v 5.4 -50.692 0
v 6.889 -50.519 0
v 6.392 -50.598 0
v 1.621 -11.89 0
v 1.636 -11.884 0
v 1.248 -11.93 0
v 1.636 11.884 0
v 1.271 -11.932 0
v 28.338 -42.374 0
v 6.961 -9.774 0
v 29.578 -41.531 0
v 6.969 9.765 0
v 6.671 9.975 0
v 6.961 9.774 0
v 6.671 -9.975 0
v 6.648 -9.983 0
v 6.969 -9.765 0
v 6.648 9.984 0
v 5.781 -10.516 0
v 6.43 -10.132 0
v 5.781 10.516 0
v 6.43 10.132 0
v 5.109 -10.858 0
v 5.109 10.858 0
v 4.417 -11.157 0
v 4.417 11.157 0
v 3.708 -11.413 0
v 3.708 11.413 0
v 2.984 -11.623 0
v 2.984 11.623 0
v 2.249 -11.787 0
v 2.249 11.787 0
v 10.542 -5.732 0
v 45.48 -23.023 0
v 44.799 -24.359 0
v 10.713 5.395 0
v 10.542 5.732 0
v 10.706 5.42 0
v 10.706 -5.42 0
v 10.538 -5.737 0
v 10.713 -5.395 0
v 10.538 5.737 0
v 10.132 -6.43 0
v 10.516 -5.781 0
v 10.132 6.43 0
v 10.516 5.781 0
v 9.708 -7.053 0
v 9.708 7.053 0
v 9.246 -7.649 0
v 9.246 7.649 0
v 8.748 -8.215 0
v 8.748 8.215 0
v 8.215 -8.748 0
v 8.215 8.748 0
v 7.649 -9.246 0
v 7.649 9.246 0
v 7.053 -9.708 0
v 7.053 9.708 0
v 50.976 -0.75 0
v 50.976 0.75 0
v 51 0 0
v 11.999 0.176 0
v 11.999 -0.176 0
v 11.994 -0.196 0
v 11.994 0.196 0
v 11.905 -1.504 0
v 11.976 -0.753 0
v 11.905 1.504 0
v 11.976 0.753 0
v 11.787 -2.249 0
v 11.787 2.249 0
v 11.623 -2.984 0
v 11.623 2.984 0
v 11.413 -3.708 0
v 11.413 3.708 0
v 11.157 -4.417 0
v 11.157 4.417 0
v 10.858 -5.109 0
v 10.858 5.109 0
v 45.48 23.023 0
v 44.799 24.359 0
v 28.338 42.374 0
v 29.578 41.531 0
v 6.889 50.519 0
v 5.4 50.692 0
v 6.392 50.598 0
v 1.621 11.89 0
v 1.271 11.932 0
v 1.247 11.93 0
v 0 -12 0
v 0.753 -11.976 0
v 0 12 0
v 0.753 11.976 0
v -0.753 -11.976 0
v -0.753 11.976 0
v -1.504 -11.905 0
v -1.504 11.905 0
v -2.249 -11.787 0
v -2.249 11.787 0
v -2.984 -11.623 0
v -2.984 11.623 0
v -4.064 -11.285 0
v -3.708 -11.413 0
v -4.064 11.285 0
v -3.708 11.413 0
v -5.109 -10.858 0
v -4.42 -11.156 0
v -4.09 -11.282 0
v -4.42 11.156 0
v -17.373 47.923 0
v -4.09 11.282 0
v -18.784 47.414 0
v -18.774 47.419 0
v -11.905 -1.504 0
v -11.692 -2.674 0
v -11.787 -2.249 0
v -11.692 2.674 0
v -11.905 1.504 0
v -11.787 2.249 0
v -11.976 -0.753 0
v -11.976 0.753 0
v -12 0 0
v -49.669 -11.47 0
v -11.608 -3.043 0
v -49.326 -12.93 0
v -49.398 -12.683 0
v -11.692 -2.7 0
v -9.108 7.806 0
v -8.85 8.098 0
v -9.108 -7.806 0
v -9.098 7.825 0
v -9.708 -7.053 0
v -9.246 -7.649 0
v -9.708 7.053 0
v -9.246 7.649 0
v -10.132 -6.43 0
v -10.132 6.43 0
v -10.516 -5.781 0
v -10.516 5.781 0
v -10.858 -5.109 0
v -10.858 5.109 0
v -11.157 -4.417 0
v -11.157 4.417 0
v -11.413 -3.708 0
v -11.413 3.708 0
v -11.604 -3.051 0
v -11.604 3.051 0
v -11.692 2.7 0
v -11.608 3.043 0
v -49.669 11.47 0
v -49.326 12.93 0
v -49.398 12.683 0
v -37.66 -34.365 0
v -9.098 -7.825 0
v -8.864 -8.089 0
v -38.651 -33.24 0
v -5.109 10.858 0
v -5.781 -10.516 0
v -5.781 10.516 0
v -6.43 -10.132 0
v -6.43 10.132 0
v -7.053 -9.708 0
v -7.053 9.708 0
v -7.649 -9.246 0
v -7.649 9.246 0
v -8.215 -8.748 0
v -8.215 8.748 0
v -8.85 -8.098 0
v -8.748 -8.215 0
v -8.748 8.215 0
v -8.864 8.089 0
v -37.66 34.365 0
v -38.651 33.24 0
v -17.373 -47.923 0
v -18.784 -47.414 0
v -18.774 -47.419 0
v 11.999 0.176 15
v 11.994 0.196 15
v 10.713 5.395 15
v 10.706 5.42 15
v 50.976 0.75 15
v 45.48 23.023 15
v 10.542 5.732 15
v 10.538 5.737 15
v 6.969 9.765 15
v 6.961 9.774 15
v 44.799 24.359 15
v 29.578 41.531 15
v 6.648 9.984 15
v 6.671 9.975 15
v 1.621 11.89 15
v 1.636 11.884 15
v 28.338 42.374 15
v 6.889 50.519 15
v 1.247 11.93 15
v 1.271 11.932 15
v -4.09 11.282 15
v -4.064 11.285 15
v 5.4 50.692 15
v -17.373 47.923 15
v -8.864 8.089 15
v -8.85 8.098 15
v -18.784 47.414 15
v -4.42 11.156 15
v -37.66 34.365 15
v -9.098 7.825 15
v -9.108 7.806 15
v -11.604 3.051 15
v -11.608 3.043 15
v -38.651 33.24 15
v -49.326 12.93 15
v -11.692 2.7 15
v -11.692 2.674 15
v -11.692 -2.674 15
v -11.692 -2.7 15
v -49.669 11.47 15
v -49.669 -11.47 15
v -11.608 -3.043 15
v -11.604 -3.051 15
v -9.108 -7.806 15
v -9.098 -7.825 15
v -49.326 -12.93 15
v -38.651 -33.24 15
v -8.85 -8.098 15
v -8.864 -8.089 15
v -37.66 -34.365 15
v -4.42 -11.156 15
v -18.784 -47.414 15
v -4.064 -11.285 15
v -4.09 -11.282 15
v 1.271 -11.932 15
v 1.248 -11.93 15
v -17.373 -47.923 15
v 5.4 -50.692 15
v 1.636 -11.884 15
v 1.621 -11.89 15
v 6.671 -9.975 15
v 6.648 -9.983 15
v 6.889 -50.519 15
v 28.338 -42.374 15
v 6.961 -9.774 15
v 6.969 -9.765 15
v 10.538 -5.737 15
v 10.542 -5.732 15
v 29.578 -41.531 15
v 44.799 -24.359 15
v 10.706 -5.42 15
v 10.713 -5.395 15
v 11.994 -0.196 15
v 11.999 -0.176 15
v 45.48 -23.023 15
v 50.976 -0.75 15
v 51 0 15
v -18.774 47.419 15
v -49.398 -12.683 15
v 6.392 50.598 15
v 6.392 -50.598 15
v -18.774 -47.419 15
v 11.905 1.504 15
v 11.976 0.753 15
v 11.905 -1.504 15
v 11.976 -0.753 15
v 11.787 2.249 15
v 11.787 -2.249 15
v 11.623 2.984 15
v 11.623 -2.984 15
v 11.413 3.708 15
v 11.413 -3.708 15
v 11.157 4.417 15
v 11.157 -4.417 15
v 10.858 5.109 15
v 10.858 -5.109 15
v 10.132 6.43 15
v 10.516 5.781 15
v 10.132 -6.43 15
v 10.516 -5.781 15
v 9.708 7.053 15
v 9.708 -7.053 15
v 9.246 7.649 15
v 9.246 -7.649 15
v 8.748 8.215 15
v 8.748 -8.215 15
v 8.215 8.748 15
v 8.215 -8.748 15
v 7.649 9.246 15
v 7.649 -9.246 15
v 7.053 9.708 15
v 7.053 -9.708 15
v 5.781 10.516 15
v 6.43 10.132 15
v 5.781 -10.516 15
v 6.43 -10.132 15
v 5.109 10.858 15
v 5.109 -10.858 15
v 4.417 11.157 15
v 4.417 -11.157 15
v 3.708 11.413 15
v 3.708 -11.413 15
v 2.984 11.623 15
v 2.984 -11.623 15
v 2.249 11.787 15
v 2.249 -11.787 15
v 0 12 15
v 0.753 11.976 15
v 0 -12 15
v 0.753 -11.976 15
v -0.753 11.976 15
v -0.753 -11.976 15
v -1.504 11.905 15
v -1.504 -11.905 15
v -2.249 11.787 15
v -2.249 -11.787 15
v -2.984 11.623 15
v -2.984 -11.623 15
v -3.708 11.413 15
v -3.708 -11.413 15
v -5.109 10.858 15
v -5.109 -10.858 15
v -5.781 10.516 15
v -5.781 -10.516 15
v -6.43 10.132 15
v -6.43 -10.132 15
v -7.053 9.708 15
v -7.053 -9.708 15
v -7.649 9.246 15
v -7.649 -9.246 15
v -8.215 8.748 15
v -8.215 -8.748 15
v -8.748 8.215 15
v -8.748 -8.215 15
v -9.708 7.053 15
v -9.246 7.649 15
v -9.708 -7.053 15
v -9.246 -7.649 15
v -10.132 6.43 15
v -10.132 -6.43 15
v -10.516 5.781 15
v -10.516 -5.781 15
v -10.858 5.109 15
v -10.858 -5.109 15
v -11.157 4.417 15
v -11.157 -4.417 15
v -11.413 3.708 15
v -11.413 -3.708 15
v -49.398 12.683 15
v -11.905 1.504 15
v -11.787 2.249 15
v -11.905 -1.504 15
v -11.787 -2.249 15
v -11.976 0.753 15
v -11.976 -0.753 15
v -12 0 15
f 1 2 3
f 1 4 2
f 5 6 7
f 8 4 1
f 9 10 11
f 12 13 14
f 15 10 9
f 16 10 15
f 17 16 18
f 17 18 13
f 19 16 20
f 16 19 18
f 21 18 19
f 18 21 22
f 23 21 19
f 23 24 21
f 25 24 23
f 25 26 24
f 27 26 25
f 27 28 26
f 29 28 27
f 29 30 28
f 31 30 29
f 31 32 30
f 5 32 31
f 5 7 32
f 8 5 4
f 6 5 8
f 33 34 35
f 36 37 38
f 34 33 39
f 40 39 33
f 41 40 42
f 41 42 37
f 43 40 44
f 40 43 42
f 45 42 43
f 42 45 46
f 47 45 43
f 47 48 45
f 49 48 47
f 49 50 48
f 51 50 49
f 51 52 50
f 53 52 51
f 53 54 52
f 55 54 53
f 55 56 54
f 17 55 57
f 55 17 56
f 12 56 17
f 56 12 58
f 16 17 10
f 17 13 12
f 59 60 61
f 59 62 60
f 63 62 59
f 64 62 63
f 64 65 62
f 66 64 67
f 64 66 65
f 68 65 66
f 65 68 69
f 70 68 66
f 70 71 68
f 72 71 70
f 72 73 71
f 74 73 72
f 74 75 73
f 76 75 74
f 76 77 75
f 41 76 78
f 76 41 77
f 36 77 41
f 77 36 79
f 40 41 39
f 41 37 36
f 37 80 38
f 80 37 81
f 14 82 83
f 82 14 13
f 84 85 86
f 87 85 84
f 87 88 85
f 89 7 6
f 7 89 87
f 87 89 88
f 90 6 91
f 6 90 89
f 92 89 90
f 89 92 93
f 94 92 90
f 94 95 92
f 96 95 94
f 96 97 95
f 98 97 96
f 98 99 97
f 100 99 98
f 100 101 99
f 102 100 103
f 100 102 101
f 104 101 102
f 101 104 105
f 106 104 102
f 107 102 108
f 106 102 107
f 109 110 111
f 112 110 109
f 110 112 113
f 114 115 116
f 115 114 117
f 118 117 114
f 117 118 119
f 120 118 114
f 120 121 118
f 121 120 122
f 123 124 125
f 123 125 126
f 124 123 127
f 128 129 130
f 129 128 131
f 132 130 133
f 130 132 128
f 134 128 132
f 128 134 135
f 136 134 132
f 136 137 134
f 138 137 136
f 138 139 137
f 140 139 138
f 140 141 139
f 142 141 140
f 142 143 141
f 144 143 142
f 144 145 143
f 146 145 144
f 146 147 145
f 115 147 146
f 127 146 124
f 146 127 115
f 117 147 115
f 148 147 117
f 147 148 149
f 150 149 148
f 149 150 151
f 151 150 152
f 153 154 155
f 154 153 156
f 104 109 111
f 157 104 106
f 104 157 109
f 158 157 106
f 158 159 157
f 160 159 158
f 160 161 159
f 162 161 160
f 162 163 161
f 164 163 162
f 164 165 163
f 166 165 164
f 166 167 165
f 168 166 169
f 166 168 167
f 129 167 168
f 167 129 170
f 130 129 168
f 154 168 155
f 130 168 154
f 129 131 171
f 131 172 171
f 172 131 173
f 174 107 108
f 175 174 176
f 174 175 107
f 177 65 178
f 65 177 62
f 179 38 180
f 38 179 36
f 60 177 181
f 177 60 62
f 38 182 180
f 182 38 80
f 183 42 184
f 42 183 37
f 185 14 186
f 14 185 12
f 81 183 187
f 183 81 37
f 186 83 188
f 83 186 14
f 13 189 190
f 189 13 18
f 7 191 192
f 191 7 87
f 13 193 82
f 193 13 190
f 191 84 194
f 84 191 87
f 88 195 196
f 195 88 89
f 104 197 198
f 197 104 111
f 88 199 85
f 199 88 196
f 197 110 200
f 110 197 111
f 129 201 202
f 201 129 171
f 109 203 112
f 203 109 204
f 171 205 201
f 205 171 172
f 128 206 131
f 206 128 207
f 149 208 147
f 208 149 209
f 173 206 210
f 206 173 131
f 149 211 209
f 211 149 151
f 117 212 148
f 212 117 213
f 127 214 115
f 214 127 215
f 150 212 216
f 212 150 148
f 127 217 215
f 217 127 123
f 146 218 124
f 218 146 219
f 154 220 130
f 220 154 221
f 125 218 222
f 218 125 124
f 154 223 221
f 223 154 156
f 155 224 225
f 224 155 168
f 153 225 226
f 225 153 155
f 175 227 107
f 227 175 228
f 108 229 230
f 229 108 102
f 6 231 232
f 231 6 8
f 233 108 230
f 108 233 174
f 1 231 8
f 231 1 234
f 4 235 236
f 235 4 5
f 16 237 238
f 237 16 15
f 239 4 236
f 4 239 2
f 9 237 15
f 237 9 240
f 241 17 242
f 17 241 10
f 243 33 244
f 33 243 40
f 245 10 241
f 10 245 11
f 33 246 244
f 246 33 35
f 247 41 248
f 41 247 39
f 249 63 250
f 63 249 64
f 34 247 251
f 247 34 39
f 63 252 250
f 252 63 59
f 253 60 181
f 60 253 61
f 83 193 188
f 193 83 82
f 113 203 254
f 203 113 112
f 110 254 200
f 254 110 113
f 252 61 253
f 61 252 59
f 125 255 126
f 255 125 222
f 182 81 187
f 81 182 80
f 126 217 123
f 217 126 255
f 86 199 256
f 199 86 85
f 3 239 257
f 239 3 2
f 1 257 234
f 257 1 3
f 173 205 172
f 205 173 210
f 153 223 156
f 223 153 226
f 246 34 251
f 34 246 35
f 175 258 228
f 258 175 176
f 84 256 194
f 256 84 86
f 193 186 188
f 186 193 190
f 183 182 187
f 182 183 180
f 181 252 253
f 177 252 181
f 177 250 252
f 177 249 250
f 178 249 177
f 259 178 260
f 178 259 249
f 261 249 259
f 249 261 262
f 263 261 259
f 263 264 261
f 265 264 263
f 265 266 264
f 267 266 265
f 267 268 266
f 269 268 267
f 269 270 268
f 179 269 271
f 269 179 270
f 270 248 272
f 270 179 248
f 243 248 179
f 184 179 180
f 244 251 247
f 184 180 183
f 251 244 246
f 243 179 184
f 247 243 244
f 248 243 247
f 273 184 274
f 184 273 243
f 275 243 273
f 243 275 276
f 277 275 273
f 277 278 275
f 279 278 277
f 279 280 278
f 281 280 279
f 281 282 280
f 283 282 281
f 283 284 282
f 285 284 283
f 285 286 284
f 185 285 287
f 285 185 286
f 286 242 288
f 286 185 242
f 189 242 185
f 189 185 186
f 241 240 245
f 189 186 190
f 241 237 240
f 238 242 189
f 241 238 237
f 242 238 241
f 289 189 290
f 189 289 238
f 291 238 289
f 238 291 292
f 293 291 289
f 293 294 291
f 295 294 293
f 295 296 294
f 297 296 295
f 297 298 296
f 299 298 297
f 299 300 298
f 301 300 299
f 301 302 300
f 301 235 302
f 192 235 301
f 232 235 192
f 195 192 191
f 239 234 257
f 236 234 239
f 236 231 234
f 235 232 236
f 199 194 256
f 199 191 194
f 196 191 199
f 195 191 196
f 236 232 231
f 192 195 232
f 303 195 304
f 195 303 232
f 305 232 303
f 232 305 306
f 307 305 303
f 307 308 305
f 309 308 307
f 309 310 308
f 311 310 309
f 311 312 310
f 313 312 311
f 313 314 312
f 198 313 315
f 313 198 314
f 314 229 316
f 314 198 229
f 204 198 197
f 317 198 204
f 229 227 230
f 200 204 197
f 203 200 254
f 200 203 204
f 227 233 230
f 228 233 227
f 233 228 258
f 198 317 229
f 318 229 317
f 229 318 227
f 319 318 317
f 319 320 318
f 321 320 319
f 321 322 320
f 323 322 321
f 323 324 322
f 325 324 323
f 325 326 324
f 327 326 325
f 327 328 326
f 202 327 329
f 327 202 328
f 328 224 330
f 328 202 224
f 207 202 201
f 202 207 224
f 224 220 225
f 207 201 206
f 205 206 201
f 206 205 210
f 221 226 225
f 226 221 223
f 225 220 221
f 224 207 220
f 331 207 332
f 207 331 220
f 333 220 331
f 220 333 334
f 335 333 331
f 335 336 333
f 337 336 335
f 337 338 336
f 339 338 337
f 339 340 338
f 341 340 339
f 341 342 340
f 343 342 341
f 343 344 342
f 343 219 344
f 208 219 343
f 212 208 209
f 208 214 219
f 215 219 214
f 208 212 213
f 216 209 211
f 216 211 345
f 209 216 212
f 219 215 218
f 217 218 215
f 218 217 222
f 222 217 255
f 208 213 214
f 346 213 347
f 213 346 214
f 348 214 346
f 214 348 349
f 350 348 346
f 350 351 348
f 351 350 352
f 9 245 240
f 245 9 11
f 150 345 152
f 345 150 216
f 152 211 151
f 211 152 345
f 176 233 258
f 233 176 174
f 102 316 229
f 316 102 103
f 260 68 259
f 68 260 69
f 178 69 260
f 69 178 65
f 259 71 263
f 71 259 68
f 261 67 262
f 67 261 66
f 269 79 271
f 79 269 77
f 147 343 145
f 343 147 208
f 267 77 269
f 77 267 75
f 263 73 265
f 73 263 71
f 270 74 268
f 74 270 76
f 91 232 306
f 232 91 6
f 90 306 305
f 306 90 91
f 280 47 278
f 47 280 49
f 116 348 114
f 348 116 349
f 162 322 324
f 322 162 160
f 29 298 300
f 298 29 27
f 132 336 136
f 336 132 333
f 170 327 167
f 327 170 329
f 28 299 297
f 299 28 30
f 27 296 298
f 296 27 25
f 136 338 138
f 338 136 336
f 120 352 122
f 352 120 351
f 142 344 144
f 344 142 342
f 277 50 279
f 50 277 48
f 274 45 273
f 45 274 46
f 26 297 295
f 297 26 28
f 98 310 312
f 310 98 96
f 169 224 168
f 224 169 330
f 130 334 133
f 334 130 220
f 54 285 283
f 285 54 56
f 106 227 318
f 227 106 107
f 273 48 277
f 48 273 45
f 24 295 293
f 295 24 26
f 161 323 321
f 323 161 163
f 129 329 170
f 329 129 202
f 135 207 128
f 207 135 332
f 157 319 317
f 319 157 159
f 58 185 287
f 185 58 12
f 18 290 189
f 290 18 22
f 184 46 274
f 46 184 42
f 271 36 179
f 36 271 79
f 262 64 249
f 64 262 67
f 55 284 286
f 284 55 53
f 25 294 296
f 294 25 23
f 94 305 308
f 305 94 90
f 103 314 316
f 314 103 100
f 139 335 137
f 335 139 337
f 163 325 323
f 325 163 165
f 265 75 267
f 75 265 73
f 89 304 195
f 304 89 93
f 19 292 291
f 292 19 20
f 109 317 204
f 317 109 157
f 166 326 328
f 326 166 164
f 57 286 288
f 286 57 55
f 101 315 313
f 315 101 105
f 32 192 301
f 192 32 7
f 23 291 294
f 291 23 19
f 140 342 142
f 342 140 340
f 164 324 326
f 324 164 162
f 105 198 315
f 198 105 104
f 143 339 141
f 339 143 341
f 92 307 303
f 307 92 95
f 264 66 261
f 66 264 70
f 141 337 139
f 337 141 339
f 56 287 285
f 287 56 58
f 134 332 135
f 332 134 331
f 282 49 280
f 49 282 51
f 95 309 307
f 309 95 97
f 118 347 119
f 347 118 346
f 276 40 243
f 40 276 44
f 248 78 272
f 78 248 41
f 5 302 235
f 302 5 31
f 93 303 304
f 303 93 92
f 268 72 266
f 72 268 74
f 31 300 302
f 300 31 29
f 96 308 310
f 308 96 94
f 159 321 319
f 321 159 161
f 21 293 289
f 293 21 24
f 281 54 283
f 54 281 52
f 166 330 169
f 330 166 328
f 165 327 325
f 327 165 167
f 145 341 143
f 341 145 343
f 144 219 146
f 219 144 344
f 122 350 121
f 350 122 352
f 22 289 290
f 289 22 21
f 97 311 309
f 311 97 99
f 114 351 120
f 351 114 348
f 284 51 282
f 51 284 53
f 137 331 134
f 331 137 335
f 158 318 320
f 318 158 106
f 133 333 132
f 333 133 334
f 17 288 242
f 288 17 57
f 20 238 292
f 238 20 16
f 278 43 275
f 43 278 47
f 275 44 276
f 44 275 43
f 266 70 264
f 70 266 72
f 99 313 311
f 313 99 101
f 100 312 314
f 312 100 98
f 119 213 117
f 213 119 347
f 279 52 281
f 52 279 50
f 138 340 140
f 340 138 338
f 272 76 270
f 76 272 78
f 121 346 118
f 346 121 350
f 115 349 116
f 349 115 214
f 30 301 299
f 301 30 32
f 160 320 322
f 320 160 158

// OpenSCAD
// Medify - Floor 2: The Windmail (Robust Geometry Version)
$fn = 100;

// --- פרמטרים הנדסיים ---
outer_dia = 102;      
height = 15;          
wall_thickness = 1.5; 
compartments = 13;
center_core_r = 10;   

angle_per_comp = 360 / compartments;
wall_angle = (wall_thickness * 360) / (PI * outer_dia); 
cutout_angle = angle_per_comp - wall_angle;

union() {
    difference() {
        // 1. הגוף המרכזי
        cylinder(h = height, d = outer_dia);

        // 2. חיתוך 13 התאים - עם הגדלת עובי החיבור (Fillet Offset)
        for (i = [0 : compartments - 1]) {
            rotate([0, 0, i * angle_per_comp + wall_angle/2])
            intersection() {
                translate([0, 0, -1]) cylinder(h = height + 2, r = outer_dia/2 + 2);
                linear_extrude(height = height + 2)
                    polygon(points=[
                        // הזזנו את נקודת ההתחלה ל-12 מ"מ (2 מ"מ מחוץ לליבה)
                        // זה יוצר שטח פנים רחב יותר לחיבור הקירות
                        [center_core_r + 2, 0], 
                        [outer_dia + 2, 0],
                        [outer_dia * 2 * cos(cutout_angle), outer_dia * 2 * sin(cutout_angle)],
                        [(center_core_r + 2) * cos(cutout_angle), (center_core_r + 2) * sin(cutout_angle)]
                    ]);
            }
        }

        // 3. חור הציר - Double-D Shaft
        translate([0, 0, -1])
        intersection() {
            cylinder(h = height + 2, d = 5.2); 
            translate([0, 0, (height + 2)/2])
                cube([3.2, 10, height + 2], center = true);
        }
    }

    // 4. ליבה מרכזית מעובה (Hub) שמלחמה את כל הלהבים יחד
    // הליבה עכשיו גדולה מספיק כדי "לבלוע" את קצוות החיתוכים
    cylinder(h = height, r = center_core_r + 2);
}
